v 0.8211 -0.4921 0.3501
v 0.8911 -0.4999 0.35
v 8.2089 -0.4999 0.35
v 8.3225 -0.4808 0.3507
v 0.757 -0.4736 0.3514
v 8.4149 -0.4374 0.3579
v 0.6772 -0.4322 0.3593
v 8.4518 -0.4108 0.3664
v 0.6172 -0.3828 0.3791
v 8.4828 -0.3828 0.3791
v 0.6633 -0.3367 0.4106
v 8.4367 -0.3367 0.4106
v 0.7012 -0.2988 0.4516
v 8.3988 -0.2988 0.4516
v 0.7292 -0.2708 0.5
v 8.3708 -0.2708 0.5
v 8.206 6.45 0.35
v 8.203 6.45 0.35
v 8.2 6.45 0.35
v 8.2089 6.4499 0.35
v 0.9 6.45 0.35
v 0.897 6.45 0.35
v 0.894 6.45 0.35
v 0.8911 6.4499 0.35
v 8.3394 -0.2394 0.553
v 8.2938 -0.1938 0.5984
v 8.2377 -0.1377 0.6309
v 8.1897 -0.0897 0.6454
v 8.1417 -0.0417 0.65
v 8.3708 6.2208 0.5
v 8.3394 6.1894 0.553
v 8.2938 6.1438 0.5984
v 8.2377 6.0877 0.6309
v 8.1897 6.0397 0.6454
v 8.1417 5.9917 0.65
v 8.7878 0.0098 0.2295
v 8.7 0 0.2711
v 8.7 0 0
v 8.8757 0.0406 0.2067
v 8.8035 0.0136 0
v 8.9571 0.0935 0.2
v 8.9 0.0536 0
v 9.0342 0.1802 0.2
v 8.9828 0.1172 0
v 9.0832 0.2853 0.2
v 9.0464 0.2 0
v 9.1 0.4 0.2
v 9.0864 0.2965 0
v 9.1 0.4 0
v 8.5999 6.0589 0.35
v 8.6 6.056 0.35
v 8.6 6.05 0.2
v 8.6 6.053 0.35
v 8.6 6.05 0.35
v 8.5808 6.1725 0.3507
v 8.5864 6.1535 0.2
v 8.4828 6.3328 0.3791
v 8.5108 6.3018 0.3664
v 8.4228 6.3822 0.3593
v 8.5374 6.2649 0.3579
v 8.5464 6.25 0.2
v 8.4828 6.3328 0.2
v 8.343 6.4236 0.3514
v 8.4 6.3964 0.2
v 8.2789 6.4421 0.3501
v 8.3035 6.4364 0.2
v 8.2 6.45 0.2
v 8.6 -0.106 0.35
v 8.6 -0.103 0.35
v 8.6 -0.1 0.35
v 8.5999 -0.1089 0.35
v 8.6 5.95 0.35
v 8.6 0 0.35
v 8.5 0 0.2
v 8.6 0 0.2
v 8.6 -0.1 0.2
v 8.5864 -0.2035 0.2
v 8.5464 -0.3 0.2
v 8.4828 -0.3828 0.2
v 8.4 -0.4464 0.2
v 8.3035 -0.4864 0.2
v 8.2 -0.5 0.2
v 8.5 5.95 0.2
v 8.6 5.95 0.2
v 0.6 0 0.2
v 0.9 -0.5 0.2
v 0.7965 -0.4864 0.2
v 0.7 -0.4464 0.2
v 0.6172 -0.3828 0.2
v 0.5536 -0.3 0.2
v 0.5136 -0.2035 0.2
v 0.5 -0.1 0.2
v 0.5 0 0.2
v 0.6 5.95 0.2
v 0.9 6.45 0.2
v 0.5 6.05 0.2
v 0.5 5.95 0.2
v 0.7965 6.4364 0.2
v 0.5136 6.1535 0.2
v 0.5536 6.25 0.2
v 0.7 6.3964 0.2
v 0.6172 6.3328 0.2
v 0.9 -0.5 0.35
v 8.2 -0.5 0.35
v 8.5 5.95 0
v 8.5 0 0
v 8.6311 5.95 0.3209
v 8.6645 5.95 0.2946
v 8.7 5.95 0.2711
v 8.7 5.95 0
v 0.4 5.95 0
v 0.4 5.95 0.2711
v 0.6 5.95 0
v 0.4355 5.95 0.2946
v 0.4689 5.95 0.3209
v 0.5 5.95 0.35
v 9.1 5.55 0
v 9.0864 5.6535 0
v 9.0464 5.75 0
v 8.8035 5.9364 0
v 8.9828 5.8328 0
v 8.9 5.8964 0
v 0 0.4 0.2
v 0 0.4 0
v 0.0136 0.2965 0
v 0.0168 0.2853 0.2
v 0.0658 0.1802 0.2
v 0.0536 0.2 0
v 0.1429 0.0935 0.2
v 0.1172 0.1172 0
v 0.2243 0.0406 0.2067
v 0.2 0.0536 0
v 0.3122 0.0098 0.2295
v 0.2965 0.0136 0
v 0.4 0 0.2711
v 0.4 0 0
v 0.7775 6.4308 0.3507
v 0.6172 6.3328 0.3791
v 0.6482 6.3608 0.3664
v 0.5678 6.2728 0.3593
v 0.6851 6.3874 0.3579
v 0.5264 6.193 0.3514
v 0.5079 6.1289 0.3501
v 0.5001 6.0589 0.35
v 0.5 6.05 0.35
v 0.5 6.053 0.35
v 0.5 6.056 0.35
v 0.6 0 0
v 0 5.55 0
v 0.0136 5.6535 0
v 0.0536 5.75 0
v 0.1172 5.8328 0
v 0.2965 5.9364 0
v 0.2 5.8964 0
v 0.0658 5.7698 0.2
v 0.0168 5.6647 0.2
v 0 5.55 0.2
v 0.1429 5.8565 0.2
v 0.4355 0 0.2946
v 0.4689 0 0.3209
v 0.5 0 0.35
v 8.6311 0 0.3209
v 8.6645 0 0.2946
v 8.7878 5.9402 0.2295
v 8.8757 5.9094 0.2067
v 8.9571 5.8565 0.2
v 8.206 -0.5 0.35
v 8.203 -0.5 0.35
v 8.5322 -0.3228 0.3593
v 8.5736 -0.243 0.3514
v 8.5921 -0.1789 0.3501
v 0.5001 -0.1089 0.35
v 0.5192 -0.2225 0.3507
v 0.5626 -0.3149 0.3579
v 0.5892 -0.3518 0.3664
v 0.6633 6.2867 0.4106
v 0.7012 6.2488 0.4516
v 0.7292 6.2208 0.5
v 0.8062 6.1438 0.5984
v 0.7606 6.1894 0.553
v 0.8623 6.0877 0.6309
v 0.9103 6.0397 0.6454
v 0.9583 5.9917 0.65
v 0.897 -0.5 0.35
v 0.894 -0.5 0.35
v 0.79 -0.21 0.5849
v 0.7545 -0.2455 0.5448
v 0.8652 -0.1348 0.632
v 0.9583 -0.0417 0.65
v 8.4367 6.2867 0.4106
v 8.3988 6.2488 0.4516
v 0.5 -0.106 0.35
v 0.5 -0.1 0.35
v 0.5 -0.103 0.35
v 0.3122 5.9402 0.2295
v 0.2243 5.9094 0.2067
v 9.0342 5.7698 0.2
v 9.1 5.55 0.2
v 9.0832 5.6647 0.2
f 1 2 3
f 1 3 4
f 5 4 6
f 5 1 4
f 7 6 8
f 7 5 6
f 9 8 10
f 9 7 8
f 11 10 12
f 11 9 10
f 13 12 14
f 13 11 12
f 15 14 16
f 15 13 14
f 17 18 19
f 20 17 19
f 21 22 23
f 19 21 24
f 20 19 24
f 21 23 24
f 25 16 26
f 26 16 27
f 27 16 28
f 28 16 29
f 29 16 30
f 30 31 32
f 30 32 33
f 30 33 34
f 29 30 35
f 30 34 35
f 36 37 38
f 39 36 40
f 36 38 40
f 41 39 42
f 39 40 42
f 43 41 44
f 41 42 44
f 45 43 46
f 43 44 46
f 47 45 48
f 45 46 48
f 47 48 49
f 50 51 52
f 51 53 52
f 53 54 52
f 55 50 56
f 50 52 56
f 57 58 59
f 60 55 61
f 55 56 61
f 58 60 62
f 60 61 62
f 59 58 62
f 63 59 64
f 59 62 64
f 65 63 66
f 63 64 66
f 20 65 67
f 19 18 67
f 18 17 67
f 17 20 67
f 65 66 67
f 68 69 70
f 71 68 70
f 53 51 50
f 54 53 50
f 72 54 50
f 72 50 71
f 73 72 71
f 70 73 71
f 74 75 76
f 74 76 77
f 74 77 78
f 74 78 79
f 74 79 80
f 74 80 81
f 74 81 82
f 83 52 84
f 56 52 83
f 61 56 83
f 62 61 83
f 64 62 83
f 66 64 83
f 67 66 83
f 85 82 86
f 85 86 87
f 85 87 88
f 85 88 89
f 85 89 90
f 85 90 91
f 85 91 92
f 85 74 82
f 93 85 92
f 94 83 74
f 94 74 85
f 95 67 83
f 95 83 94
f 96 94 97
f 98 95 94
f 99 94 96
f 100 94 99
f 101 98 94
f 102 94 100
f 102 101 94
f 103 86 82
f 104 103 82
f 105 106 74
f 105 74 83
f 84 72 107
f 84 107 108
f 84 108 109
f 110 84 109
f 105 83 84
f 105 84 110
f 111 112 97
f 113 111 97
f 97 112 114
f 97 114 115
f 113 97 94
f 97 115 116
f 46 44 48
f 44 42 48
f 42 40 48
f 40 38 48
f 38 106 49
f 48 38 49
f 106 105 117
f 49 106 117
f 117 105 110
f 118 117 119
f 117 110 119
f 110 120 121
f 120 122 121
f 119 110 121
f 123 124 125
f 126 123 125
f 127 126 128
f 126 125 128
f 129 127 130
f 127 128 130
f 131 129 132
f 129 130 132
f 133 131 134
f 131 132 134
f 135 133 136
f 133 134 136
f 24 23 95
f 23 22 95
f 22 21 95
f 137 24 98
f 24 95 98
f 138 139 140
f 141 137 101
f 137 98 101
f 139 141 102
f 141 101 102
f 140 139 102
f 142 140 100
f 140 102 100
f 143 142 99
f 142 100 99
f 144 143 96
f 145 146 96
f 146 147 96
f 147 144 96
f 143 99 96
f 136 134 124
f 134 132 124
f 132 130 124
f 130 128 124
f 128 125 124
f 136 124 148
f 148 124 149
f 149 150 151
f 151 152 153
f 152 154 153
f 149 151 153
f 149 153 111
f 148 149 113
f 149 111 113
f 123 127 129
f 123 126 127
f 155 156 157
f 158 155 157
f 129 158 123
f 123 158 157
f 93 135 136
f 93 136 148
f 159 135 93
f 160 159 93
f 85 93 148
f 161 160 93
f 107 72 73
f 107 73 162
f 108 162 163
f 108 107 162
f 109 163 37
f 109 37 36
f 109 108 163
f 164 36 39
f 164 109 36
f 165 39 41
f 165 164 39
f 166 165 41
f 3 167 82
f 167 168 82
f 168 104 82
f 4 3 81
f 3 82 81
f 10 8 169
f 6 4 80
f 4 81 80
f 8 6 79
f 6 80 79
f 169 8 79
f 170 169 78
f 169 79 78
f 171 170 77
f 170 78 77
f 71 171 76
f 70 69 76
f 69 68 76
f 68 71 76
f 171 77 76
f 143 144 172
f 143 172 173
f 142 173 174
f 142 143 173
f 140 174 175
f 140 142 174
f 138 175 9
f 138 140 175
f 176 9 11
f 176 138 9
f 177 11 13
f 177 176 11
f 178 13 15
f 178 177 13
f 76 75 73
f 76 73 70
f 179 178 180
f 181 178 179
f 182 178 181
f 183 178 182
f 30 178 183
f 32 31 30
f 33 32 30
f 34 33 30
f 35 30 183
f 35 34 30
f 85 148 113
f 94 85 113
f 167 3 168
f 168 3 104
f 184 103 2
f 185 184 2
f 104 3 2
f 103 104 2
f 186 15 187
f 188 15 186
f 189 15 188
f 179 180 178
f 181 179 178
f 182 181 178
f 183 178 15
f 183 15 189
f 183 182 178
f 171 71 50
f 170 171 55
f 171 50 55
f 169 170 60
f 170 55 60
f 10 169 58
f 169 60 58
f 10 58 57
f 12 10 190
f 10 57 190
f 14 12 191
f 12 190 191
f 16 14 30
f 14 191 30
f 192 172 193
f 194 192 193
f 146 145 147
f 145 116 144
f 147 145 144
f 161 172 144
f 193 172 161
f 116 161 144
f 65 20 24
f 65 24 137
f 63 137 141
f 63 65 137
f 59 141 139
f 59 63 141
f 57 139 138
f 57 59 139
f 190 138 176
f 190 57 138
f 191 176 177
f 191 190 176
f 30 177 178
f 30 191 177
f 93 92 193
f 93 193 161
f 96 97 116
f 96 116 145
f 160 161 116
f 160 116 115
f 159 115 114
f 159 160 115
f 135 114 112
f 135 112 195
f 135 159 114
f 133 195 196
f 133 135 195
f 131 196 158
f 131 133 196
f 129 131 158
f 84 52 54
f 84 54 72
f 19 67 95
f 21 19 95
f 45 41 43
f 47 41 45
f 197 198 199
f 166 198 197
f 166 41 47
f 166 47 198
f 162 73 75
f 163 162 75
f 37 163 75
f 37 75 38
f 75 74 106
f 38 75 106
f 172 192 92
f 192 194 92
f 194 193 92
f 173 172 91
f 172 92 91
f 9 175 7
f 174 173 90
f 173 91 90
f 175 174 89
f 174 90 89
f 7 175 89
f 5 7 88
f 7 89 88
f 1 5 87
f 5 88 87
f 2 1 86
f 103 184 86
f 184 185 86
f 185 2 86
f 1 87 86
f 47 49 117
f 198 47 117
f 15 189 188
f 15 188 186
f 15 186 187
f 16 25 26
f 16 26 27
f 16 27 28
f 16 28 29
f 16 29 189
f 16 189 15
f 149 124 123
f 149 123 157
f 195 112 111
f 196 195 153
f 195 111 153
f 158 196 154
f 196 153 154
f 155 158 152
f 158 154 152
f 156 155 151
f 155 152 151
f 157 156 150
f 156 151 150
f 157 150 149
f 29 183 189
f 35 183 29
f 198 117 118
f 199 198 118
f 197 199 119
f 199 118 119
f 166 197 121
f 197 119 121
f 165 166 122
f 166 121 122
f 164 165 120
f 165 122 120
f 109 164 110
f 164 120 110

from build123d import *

# Parameters (mm, degrees)
SKETCH1_W             = 0.6
SKETCH1_H             = 5.95
BOSS_EXTRUDE1_DEPTH   = 0.2
BOSS_EXTRUDE1_2_DEPTH = 0.2
BOSS_EXTRUDE2_DEPTH   = 0.15
FILLET1_R             = 0.5
FILLET2_R             = 0.5
SKETCH3_W             = 7.6
SKETCH3_H             = 6.45
BOSS_EXTRUDE3_DEPTH   = 0.3
FILLET3_R             = 0.25
FILLET4_R             = 0.25
FILLET5_R             = 0.25
FILLET6_R             = 0.25
FILLET7_R             = 0.4


# Some blends are built 0.0001 mm under size
with BuildPart() as part:
    # Sketch1 → Boss-Extrude1 (new body)
    with BuildSketch(Plane.XY):
        with Locations((0.3, 2.975)):
            Rectangle(SKETCH1_W, SKETCH1_H)
    extrude(amount=BOSS_EXTRUDE1_DEPTH)



with BuildPart() as body_2:
    # Sketch1 → Boss-Extrude1 2 (new body)
    with BuildSketch(Plane.XY):
        with Locations((8.8, 2.975)):
            Rectangle(SKETCH1_W, SKETCH1_H)
    extrude(amount=BOSS_EXTRUDE1_2_DEPTH)


with BuildPart() as part_1:
    add(part.part)

    add(body_2.part)  # Boss-Extrude2 merges body 2
    # Sketch2 → Boss-Extrude2 (add)
    with BuildSketch(Plane.XY.offset(0.2)):
        Polygon((8.6, 6.45), (8.6, -0.5), (7.9, -0.5), (1.2, -0.5), (0.5, -0.5), (0.5, 6.45), (1.2, 6.45), (7.9, 6.45), align=None)
    extrude(amount=BOSS_EXTRUDE2_DEPTH)

    # Fillet1
    # the kernel refuses this fillet: 0.5 mm, written as the material it adds along each edge
    with BuildSketch(Plane(origin=(0.5, 0, 0.2), x_dir=(-1, 0, 0), z_dir=(0, 1, 0))) as fillet1_piece_1:
        with BuildLine():
            CenterArc((0.357071421, 0.5), FILLET1_R, 224.427004001, 45.572995999)
            Line((0, 0.15), (0, 0))
            Line((0, 0), (0.357071421, 0))
        make_face()
    extrude(amount=5.95)

    # Fillet2
    # the kernel refuses this fillet: 0.5 mm, written as the material it adds along each edge
    with BuildSketch(Plane(origin=(8.6, 5.95, 0.2), x_dir=(0, 0, 1), z_dir=(0, -1, 0))) as fillet2_piece_1:
        with BuildLine():
            CenterArc((0.5, -0.357071421), FILLET2_R, 134.427004001, 45.572995999)
            Line((0, -0.357071421), (0, 0))
            Line((0, 0), (0.15, 0))
        make_face()
    extrude(amount=5.95)

    # Sketch3 → Boss-Extrude3 (add)
    with BuildSketch(Plane.XY.offset(0.35)):
        with Locations((4.55, 2.975)):
            Rectangle(SKETCH3_W, SKETCH3_H)
    extrude(amount=BOSS_EXTRUDE3_DEPTH)

    # Fillet3
    fillet3_edges = [part_1.edges().sort_by_distance(p)[0] for p in [
        (0.75, 2.975, 0.35),
    ]]
    fillet(fillet3_edges, radius=FILLET3_R - 0.0001)  # a hair under: the kernel refuses the full size

    # Fillet4
    fillet4_edges = [part_1.edges().sort_by_distance(p)[0] for p in [
        (8.35, 2.975, 0.35),
    ]]
    fillet(fillet4_edges, radius=FILLET4_R - 0.0001)  # a hair under: the kernel refuses the full size

    # Fillet5
    fillet5_edges = [part_1.edges().sort_by_distance(p)[0] for p in [
        (4.55, 6.2, 0.35),
        (4.55, -0.25, 0.35),
    ]]
    fillet(fillet5_edges, radius=FILLET5_R - 0.0001)  # a hair under: the kernel refuses the full size

    # Fillet6
    fillet6_edges = [part_1.edges().sort_by_distance(p)[0] for p in [
        (8.35, 2.975, 0.65),
        (4.55, 6.2, 0.65),
        (4.55, -0.25, 0.65),
        (0.75, 2.975, 0.65),
    ]]
    fillet(fillet6_edges, radius=FILLET6_R)

    # Fillet7
    # the kernel refuses this fillet: 0.4 mm, written as the material it takes off along each edge
    with BuildSketch(Plane(origin=(9.1, 5.95, -1), x_dir=(-1, 0, 0), z_dir=(0, 0, 1)), Plane(origin=(0, 0, -1), x_dir=(1, 0, 0), z_dir=(0, 0, 1))) as fillet7_piece_1:
        with BuildLine():
            CenterArc((FILLET7_R, FILLET7_R), FILLET7_R, 180, 90)
            Line((0, FILLET7_R), (0, 0))
            Line((0, 0), (FILLET7_R, 0))
        make_face()
    extrude(amount=2.2, mode=Mode.SUBTRACT)
    with BuildSketch(Plane(origin=(8.6, 6.45, -0.8), x_dir=(0, -1, 0), z_dir=(0, 0, 1))) as fillet7_piece_2:
        with BuildLine():
            CenterArc((FILLET7_R, -FILLET7_R), FILLET7_R, 90, 90)
            Line((0, -FILLET7_R), (0, 0))
            Line((0, 0), (FILLET7_R, 0))
        make_face()
    extrude(amount=2.15, mode=Mode.SUBTRACT)
    with BuildSketch(Plane(origin=(8.6, -0.5, -0.8), x_dir=(0, 1, 0), z_dir=(0, 0, 1)), Plane(origin=(0.5, 6.45, -0.8), x_dir=(0, -1, 0), z_dir=(0, 0, 1)), Plane(origin=(0.5, -0.5, -0.8), x_dir=(1, 0, 0), z_dir=(0, 0, 1))) as fillet7_piece_3:
        with BuildLine():
            CenterArc((FILLET7_R, FILLET7_R), FILLET7_R, 180, 90)
            Line((0, FILLET7_R), (0, 0))
            Line((0, 0), (FILLET7_R, 0))
        make_face()
    extrude(amount=2.15, mode=Mode.SUBTRACT)
    with BuildSketch(Plane(origin=(9.1, 0, -1), x_dir=(-1, 0, 0), z_dir=(0, 0, 1)), Plane(origin=(0, 5.95, -1), x_dir=(1, 0, 0), z_dir=(0, 0, 1))) as fillet7_piece_4:
        with BuildLine():
            CenterArc((FILLET7_R, -FILLET7_R), FILLET7_R, 90, 90)
            Line((0, -FILLET7_R), (0, 0))
            Line((0, 0), (FILLET7_R, 0))
        make_face()
    extrude(amount=2.2, mode=Mode.SUBTRACT)


solid = part_1.part
